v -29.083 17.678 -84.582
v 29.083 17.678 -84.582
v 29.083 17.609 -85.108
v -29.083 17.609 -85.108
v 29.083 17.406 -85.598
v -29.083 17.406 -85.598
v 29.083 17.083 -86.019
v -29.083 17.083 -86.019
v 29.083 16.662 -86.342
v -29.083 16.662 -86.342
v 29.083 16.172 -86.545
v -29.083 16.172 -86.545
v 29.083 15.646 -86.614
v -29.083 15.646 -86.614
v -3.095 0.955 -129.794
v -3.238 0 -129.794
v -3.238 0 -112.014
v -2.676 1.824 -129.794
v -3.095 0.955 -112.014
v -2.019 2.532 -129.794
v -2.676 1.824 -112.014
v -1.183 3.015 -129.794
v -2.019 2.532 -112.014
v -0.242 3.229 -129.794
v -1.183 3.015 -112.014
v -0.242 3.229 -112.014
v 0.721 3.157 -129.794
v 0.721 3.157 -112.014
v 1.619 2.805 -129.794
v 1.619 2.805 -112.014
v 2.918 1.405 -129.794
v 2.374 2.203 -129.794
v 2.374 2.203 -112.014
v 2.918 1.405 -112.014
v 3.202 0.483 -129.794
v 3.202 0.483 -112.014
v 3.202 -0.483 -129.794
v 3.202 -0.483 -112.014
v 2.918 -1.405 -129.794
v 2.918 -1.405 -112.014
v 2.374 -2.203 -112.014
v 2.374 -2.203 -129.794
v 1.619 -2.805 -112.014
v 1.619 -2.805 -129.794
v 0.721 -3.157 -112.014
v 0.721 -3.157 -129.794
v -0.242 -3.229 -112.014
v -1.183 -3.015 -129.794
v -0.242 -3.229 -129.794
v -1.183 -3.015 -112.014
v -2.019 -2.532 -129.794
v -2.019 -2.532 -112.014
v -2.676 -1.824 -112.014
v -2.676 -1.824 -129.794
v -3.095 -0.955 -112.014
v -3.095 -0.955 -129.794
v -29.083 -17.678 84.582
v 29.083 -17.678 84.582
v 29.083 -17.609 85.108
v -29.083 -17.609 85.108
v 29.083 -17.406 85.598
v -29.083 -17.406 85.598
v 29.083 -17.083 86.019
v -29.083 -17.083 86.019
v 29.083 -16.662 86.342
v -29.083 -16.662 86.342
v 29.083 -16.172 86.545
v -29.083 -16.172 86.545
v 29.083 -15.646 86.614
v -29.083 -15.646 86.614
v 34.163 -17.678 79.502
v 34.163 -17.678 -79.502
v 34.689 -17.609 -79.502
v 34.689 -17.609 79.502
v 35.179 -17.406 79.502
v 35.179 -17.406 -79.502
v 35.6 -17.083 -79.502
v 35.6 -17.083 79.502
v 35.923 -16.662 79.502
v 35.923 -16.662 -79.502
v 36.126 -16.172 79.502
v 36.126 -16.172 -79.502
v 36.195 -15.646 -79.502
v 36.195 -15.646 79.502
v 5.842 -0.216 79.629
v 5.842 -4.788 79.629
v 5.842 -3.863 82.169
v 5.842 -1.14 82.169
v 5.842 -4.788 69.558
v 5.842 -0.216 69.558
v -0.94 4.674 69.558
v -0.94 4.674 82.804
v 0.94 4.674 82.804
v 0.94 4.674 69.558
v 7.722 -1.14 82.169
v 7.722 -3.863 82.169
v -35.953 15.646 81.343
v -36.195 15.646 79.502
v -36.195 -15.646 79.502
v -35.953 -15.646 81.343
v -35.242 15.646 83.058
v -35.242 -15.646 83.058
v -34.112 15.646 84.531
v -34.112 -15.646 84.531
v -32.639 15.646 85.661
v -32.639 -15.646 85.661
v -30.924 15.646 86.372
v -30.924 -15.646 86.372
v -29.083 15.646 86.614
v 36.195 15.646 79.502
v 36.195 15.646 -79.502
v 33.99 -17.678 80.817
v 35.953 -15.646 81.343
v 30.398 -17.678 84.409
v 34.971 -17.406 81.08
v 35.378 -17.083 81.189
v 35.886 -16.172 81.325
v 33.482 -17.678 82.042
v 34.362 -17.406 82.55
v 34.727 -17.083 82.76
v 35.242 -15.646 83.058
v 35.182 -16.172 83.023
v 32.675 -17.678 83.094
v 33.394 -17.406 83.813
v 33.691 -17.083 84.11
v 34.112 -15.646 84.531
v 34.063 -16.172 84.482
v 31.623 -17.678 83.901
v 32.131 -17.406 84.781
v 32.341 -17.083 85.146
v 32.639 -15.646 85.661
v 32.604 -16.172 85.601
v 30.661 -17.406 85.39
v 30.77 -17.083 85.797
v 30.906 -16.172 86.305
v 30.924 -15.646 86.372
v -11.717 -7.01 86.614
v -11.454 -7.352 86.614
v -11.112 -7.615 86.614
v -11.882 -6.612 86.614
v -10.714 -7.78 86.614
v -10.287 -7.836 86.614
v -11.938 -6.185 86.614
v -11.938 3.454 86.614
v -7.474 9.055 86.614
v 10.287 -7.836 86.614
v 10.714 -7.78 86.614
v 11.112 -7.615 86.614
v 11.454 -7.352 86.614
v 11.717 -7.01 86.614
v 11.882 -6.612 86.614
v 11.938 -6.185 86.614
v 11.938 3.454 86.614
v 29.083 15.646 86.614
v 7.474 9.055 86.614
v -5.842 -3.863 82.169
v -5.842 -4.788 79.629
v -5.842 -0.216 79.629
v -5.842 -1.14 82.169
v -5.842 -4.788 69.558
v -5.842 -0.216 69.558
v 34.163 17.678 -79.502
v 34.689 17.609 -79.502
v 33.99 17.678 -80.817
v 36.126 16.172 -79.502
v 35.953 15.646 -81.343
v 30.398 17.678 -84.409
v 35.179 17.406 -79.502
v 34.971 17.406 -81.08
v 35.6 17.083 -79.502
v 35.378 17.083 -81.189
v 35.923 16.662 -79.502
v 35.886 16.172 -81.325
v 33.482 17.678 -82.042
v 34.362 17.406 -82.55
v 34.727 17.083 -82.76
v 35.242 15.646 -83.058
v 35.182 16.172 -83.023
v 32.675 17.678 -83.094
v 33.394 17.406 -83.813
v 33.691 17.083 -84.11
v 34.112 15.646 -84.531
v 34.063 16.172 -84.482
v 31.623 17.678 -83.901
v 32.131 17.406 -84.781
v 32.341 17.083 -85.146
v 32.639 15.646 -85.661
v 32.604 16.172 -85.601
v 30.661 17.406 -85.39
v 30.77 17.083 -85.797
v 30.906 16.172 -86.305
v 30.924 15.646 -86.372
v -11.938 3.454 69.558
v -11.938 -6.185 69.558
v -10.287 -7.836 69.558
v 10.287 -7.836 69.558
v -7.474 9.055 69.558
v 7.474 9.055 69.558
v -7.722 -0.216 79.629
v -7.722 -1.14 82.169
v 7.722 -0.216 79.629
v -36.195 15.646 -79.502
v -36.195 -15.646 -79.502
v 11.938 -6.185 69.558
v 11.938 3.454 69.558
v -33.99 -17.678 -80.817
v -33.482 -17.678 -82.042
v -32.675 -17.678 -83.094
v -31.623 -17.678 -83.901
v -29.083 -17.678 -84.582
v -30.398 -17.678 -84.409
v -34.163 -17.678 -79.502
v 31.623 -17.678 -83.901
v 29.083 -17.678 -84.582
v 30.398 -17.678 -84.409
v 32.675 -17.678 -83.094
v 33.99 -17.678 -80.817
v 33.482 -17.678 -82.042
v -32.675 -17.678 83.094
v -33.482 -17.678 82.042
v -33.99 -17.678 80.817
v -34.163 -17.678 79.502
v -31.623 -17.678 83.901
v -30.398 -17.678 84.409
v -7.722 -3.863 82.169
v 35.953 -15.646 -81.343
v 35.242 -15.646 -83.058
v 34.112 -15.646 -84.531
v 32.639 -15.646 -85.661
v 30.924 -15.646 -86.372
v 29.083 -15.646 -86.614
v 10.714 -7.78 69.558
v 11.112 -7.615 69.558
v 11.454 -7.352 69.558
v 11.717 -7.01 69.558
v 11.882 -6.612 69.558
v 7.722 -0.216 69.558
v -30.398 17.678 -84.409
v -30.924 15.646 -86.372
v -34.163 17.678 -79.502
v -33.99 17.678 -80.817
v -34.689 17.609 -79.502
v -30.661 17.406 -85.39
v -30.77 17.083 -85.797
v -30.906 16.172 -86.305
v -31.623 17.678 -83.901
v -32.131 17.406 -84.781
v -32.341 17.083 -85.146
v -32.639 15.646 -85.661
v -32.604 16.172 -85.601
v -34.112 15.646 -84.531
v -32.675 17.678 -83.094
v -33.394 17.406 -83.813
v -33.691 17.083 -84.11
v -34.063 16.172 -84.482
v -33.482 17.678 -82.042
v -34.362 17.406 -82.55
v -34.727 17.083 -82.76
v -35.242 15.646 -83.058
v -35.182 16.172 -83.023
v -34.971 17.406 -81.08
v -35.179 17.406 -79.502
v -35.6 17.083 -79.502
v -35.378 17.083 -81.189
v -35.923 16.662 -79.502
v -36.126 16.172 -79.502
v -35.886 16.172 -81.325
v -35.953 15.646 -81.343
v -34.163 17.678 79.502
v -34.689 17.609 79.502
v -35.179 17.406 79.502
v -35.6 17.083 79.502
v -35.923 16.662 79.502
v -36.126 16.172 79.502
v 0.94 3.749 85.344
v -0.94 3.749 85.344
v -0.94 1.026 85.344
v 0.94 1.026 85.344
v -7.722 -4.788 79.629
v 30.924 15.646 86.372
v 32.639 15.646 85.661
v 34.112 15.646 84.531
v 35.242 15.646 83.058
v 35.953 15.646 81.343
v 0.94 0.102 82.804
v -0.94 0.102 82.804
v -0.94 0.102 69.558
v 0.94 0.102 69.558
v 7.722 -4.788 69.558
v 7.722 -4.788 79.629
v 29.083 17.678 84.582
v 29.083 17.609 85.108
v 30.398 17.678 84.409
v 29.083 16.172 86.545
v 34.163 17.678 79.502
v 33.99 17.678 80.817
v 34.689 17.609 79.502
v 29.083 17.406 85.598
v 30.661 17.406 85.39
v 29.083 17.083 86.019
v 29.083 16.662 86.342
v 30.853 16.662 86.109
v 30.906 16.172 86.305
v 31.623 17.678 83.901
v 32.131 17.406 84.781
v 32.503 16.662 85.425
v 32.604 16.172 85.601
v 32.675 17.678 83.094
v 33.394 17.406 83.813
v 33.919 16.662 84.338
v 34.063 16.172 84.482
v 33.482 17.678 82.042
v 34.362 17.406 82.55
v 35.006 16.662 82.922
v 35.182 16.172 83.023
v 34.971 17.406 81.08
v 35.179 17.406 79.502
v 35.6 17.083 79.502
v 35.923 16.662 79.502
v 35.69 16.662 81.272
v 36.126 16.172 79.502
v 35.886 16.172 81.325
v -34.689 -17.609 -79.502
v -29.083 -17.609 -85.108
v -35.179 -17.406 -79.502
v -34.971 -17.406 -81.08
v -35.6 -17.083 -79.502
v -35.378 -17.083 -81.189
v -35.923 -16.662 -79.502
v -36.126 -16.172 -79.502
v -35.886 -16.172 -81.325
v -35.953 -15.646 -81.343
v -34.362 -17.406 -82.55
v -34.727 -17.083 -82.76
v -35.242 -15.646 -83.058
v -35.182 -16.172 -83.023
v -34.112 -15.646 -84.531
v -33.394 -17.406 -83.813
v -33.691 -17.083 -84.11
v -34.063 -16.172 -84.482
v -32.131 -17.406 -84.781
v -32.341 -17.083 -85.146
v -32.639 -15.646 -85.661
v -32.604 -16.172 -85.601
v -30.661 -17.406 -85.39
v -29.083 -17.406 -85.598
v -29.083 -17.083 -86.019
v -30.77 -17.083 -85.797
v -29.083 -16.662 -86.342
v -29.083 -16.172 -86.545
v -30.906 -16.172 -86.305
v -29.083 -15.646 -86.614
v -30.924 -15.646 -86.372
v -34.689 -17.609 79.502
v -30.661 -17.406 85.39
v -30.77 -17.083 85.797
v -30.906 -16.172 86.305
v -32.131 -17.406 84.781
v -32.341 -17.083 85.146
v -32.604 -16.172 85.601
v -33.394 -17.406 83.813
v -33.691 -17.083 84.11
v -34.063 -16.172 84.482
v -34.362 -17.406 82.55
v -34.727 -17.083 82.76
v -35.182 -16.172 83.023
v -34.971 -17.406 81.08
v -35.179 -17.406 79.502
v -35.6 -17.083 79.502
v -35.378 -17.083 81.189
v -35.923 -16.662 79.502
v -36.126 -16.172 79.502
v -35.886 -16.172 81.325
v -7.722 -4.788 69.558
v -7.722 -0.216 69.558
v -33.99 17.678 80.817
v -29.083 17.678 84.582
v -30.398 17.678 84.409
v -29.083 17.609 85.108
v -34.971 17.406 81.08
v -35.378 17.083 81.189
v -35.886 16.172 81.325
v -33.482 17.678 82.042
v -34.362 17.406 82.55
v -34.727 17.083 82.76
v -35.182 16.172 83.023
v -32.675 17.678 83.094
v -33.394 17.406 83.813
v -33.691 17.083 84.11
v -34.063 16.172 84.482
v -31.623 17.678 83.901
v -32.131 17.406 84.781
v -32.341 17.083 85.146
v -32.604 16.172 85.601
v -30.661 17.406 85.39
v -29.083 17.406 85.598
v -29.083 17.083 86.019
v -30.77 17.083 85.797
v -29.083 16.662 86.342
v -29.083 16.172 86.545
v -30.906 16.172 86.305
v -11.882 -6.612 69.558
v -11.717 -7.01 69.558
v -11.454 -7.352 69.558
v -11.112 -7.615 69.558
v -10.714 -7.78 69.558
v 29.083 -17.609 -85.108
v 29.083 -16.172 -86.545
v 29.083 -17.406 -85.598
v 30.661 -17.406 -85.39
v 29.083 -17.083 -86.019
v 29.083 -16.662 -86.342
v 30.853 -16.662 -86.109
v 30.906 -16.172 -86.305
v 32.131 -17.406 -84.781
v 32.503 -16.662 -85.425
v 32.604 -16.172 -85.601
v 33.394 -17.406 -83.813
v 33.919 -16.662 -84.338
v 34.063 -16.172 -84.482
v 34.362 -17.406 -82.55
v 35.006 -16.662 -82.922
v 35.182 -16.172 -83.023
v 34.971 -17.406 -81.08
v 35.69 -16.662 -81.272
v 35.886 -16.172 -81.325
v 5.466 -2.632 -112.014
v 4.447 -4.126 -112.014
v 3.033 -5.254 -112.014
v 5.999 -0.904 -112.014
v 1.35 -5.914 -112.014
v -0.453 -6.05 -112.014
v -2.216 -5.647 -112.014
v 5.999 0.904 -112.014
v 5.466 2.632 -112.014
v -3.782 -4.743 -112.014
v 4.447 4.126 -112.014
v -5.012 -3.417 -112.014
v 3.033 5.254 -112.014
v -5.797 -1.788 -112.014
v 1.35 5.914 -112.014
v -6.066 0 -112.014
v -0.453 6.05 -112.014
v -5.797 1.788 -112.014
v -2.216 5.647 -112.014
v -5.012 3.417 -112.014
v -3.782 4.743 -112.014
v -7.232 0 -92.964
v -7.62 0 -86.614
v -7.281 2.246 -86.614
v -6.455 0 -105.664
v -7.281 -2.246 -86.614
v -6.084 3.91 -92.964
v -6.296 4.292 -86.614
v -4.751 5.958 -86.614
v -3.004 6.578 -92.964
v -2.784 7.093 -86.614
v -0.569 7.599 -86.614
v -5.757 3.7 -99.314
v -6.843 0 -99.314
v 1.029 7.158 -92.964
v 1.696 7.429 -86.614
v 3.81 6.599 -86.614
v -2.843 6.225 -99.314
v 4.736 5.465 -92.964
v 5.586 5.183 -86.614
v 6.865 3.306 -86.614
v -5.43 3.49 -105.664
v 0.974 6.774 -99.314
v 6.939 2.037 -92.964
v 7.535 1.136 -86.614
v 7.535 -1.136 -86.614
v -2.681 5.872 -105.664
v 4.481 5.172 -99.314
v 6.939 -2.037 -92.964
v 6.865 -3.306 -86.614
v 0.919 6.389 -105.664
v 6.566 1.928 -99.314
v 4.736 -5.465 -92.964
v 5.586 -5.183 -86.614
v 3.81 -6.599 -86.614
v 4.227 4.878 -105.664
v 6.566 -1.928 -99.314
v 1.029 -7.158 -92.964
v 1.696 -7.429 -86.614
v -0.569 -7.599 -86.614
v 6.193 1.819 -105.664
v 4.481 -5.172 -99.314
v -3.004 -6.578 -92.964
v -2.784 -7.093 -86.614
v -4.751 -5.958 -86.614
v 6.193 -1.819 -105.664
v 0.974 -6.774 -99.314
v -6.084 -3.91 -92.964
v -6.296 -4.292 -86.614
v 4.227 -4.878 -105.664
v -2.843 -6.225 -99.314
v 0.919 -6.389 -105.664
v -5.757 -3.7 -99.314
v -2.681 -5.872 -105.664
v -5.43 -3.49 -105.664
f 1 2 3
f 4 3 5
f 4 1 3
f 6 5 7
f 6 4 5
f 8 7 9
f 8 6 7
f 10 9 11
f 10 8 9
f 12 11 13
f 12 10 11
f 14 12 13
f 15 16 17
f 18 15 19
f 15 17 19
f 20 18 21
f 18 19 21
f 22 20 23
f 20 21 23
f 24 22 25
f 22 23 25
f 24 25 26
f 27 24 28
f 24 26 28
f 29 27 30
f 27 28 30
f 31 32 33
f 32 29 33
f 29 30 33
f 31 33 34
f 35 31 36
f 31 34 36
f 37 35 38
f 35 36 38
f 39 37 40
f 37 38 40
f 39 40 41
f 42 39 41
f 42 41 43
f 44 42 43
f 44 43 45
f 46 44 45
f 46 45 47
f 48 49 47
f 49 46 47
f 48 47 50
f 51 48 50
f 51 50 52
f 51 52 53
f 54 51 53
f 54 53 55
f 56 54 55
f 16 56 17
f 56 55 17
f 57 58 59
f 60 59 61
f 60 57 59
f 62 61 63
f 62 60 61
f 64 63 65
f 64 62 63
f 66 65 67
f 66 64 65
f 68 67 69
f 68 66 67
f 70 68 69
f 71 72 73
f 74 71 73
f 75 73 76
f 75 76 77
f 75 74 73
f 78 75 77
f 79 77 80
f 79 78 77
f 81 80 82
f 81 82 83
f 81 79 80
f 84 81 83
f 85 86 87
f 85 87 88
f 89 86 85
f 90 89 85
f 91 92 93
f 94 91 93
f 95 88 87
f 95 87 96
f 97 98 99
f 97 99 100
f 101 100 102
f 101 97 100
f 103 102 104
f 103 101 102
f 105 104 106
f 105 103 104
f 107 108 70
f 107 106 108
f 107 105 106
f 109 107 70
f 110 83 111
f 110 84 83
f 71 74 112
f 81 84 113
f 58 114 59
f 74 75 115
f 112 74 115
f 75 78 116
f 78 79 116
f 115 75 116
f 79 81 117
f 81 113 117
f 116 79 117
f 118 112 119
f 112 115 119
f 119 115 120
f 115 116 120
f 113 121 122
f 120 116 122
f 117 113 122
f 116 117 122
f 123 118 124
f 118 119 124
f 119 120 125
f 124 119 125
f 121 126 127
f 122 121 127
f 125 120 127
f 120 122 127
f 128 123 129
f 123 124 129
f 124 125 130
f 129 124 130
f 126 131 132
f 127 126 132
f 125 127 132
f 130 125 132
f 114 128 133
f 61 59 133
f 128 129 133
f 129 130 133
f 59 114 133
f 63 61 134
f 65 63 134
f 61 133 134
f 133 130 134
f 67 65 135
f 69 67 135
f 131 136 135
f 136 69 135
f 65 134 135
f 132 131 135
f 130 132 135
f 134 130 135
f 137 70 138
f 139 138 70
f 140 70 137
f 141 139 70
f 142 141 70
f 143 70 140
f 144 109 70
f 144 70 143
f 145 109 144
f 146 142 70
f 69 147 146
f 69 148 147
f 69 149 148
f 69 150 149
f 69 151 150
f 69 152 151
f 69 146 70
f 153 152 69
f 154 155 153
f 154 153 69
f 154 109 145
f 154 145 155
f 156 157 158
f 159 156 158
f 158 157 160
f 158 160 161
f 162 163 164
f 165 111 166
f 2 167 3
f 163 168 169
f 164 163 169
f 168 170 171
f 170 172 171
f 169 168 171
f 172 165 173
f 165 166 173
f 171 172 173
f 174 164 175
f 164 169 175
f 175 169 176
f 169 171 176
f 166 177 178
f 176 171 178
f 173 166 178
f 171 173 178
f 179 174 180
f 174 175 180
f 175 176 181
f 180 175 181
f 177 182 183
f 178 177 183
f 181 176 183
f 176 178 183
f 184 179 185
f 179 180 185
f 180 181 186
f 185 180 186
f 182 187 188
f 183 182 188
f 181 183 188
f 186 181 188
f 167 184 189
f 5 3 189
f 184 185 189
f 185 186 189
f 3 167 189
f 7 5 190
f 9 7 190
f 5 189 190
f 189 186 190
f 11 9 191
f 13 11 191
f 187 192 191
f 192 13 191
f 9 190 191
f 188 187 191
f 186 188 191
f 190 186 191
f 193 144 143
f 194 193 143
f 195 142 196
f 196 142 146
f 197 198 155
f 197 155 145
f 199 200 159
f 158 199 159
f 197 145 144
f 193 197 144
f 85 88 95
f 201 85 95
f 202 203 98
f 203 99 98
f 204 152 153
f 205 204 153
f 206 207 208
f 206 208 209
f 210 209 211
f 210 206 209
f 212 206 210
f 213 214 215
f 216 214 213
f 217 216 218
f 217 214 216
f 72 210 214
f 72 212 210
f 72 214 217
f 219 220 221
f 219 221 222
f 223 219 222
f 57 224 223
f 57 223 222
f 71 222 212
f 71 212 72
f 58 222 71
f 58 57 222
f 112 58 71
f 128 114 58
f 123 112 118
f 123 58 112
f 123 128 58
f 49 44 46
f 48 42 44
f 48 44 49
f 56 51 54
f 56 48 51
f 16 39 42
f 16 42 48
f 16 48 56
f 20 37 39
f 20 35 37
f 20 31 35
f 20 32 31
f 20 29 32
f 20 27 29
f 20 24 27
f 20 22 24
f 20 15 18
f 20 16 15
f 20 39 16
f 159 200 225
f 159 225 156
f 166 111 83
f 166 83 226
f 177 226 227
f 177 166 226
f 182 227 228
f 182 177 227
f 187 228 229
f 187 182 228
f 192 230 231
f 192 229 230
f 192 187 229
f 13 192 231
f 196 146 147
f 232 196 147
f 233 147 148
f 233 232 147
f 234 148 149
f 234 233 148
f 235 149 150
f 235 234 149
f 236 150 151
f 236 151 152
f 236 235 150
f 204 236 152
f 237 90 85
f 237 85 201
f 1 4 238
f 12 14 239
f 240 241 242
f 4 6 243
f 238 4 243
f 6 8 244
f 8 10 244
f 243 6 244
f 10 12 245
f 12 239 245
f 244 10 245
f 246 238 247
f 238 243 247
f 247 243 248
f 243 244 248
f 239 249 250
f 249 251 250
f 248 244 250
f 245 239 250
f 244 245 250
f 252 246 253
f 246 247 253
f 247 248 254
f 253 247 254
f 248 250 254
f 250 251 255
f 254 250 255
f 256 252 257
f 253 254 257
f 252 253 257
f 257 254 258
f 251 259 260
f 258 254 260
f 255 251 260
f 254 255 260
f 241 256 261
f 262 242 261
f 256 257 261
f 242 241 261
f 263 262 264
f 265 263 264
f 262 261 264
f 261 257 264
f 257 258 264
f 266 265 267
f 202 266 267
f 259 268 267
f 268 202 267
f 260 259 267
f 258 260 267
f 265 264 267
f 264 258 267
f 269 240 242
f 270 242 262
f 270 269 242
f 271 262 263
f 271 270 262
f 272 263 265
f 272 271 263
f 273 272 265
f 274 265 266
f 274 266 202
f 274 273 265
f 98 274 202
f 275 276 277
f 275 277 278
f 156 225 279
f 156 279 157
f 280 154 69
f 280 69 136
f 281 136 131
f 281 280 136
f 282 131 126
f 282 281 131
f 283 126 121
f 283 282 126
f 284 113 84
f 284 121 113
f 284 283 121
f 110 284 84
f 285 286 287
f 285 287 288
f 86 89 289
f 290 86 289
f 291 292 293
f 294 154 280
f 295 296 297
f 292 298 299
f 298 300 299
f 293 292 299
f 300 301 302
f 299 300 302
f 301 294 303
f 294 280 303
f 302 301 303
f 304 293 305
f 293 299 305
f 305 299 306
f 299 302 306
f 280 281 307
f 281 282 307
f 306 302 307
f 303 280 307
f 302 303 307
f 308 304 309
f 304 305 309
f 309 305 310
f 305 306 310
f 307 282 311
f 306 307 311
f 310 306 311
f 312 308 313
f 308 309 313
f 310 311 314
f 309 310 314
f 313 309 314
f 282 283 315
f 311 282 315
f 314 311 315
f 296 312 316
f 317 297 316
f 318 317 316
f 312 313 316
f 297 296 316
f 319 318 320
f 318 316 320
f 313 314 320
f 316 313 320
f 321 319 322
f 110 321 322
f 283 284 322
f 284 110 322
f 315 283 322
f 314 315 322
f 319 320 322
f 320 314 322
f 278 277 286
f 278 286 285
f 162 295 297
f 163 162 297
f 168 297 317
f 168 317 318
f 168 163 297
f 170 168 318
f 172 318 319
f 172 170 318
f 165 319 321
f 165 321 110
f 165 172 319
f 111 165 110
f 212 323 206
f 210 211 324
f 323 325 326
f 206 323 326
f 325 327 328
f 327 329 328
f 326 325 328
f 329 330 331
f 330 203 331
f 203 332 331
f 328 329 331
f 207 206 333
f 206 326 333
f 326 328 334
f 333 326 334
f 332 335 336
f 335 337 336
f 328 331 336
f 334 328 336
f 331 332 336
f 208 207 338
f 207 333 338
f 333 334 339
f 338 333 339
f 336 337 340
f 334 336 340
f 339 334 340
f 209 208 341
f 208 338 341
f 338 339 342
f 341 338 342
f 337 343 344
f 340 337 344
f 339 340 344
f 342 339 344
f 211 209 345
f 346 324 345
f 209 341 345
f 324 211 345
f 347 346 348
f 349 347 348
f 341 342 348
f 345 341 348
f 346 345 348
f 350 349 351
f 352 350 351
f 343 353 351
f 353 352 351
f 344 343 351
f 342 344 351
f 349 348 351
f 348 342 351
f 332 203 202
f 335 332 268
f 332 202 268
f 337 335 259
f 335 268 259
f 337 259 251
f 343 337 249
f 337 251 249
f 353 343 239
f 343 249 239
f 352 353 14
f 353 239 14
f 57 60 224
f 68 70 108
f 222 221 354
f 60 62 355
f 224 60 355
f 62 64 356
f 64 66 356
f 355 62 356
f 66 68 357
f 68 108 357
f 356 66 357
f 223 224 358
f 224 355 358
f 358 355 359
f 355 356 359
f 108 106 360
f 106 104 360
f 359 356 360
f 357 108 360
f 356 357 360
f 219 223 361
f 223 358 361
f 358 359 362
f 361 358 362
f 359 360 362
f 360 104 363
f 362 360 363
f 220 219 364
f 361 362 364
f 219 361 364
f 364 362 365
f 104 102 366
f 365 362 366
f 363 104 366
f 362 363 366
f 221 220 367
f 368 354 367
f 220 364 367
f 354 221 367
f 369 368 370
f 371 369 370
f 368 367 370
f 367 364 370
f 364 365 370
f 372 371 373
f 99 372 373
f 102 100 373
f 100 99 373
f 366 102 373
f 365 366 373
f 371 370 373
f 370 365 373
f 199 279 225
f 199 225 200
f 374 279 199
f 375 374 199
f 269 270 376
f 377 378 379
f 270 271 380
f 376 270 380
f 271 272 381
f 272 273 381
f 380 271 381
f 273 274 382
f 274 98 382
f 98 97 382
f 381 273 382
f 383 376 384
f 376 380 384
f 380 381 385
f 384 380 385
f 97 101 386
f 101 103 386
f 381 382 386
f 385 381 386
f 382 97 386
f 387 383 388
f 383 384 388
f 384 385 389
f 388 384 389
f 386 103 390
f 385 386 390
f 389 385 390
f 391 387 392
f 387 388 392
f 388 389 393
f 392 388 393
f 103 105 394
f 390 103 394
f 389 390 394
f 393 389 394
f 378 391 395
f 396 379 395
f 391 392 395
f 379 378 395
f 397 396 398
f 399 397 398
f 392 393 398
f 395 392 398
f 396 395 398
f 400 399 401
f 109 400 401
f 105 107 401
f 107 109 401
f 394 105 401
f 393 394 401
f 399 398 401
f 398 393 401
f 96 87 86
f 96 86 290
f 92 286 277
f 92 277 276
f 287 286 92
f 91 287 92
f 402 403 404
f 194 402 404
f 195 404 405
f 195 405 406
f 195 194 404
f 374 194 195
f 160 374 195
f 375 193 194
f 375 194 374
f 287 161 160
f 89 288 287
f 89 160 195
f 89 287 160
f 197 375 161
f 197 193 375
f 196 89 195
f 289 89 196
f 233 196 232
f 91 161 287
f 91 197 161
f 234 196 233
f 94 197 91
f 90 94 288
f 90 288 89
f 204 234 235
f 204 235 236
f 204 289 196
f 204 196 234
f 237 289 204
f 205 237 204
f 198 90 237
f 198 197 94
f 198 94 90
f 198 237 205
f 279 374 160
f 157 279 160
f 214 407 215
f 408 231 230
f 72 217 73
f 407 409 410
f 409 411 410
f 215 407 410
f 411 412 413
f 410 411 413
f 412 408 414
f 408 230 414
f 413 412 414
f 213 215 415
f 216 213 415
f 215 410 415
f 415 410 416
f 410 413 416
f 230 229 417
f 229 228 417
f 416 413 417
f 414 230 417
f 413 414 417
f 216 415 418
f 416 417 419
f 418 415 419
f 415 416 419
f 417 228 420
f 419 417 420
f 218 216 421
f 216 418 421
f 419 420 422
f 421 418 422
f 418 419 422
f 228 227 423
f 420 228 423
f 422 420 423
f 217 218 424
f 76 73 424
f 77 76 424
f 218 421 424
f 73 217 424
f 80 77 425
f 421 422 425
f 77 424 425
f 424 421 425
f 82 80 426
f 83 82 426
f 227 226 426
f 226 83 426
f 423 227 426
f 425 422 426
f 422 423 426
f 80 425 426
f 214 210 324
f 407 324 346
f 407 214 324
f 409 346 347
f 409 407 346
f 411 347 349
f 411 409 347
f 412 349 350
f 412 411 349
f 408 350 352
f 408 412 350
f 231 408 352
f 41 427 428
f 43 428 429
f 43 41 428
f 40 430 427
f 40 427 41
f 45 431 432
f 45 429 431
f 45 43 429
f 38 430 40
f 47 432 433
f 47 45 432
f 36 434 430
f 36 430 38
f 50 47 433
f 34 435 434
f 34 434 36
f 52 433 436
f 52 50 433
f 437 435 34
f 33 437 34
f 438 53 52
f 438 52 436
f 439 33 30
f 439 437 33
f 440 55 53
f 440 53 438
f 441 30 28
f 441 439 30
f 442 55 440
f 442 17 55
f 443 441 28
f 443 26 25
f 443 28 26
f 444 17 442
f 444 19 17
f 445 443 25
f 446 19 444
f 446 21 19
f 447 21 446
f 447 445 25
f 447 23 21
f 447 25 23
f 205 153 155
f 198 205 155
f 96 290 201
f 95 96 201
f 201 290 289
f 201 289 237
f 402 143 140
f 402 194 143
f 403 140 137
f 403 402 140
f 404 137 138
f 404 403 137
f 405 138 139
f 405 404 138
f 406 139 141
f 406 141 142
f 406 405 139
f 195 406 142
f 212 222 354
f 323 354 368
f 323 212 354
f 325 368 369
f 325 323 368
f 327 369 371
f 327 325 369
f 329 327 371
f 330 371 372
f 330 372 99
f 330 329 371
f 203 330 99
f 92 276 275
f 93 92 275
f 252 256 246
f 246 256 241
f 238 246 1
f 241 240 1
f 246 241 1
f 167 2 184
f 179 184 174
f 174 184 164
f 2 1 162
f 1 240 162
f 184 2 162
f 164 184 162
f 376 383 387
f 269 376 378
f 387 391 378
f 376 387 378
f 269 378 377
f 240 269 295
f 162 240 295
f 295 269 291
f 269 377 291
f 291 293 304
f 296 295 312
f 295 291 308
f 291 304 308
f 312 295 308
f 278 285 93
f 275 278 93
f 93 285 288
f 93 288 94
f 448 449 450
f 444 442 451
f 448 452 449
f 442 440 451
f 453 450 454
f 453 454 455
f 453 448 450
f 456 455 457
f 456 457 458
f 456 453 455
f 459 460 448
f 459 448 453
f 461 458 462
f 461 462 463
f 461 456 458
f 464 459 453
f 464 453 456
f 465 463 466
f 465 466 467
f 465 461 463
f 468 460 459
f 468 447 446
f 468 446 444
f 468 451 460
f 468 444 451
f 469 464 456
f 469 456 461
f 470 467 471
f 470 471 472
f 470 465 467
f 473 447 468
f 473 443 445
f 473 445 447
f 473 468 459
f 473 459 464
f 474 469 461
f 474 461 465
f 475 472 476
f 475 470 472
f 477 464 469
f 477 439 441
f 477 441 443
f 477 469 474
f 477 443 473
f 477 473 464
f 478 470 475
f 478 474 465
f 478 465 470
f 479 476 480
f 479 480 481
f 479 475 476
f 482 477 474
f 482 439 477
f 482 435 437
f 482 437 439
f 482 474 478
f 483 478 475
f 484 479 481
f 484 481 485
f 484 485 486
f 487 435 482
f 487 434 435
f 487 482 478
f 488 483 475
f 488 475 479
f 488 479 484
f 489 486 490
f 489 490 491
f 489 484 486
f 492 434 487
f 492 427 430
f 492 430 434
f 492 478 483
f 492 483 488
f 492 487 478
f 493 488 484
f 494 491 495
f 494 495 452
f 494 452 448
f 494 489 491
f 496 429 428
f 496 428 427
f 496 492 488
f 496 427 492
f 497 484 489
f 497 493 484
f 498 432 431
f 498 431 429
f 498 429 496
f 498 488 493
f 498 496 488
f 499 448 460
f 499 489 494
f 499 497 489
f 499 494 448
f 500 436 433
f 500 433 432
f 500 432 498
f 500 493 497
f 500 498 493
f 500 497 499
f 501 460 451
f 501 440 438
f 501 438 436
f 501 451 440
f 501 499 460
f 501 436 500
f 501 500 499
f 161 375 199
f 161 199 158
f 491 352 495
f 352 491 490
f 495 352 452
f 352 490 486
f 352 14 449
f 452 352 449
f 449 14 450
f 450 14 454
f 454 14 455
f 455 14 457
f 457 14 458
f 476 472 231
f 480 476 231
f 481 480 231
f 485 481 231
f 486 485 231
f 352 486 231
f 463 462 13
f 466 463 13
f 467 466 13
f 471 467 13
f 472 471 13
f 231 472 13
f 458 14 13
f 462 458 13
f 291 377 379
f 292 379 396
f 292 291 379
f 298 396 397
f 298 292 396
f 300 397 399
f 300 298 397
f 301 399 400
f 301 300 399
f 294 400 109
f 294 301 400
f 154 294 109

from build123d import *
from OCP.BRepFilletAPI import BRepFilletAPI_MakeChamfer

# Parameters (mm, degrees)
SKETCH1_W           = 72.39
SKETCH1_H           = 35.3568
BOSS_EXTRUDE1_DEPTH = 86.614
FILLET1_R           = 7.112
FILLET2_R           = 2.032
CUT_EXTRUDE1_DEPTH  = 17.0561
FILLET3_R           = 1.651
SKETCH3_W           = 1.8796
SKETCH3_H           = 4.572
BOSS_EXTRUDE2_DEPTH = 15.7861
SKETCH4_W           = 15.4432
SKETCH4_H           = 4.572
CUT_EXTRUDE2_DEPTH  = 3.175
CHAMFER1_SIZE       = 2.54
CHAMFER1_SIZE2      = 0.924484395
SKETCH5_R           = 7.62
BOSS_EXTRUDE3_DEPTH = 25.4
BOSS_EXTRUDE3_TAPER = 3.5
SKETCH7_R           = 3.2385
BOSS_EXTRUDE4_DEPTH = 32.766
SKETCH8_R           = 10.8966
BOSS_EXTRUDE5_DEPTH = 34.417
FILLET4_R           = 0.635
SKETCH9_R           = 3.2385
BOSS_EXTRUDE6_DEPTH = 34.417
SKETCH10_R          = 27.900404375
CUT_EXTRUDE3_DEPTH  = 83.82


with BuildPart() as part:
    # Sketch1 → Boss-Extrude1 (new, symmetric)
    with BuildSketch(Plane.XY):
        Rectangle(SKETCH1_W, SKETCH1_H)
    extrude(amount=BOSS_EXTRUDE1_DEPTH, both=True)

    # Fillet1
    fillet1_edges = [part.edges().sort_by_distance(p)[0] for p in [
        (36.195, 0, 86.614),
        (-36.195, 0, 86.614),
        (36.195, 0, -86.614),
        (-36.195, 0, -86.614),
    ]]
    fillet(fillet1_edges, radius=FILLET1_R)

    # Fillet2
    fillet2_edges = [part.edges().sort_by_distance(p)[0] for p in [
        (36.195, 17.6784, 0),
        (36.195, -17.6784, 0),
        (0, 17.6784, -86.614),
        (-36.195, 17.6784, 0),
        (0, 17.6784, 86.614),
        (-34.111943428, 17.6784, 84.530943428),
        (34.111943428, 17.6784, 84.530943428),
        (-34.111943428, 17.6784, -84.530943428),
        (34.111943428, 17.6784, -84.530943428),
        (0, -17.6784, -86.614),
        (0, -17.6784, 86.614),
        (-36.195, -17.6784, 0),
        (-34.111943428, -17.6784, 84.530943428),
        (34.111943428, -17.6784, 84.530943428),
        (-34.111943428, -17.6784, -84.530943428),
        (34.111943428, -17.6784, -84.530943428),
    ]]
    fillet(fillet2_edges, radius=FILLET2_R)

    # Sketch2 → Cut-Extrude1 (cut)
    with BuildSketch(Plane.XY.offset(86.614)):
        Polygon((7.47395, 9.0551), (-7.47395, 9.0551), (-11.938, 3.4544), (-11.938, -7.8359), (11.938, -7.8359), (11.938, 3.4544), align=None)
    extrude(amount=-CUT_EXTRUDE1_DEPTH, mode=Mode.SUBTRACT)

    # Fillet3
    fillet3_edges = [part.edges().sort_by_distance(p)[0] for p in [
        (11.938, -7.8359, 78.08595),
        (-11.938, -7.8359, 78.08595),
    ]]
    fillet(fillet3_edges, radius=FILLET3_R)

    # Sketch3 → Boss-Extrude2 (add)
    with BuildSketch(Plane.XY.offset(69.5579)):
        with Locations((-6.7818, -2.5019)):
            Rectangle(SKETCH3_W, SKETCH3_H)
        with Locations((0, 2.3876)):
            Rectangle(SKETCH3_W, SKETCH3_H)
        with Locations((6.7818, -2.5019)):
            Rectangle(SKETCH3_W, SKETCH3_H)
    extrude(amount=BOSS_EXTRUDE2_DEPTH)

    # Sketch4 → Cut-Extrude2 (cut)
    with BuildSketch(Plane.XY.offset(85.344)):
        with Locations((0, -2.5019)):
            Rectangle(SKETCH4_W, SKETCH4_H)
    extrude(amount=-CUT_EXTRUDE2_DEPTH, mode=Mode.SUBTRACT)

    # Chamfer1: one chamfer whose edges measure the first distance from different faces: ONE call of the kernel's chamfer builder (chamfer() names one face for all edges)
    chamfer1_edges_1 = [part.edges().sort_by_distance(p)[0] for p in [
        (0, 4.6736, 85.344),
    ]]
    chamfer1_side_1 = [part.faces().sort_by_distance(p)[0] for p in [
        (0, 4.6736, 77.45095),
    ]]
    chamfer1_edges_2 = [part.edges().sort_by_distance(p)[0] for p in [
        (0, 0.1016, 85.344),
    ]]
    chamfer1_side_2 = [part.faces().sort_by_distance(p)[0] for p in [
        (0, 0.1016, 77.45095),
    ]]
    chamfer1_edges_3 = [part.edges().sort_by_distance(p)[0] for p in [
        (-6.7818, -0.2159, 82.169),
    ]]
    chamfer1_side_3 = [part.faces().sort_by_distance(p)[0] for p in [
        (-6.7818, -0.2159, 75.86345),
    ]]
    chamfer1_edges_4 = [part.edges().sort_by_distance(p)[0] for p in [
        (6.7818, -0.2159, 82.169),
    ]]
    chamfer1_side_4 = [part.faces().sort_by_distance(p)[0] for p in [
        (6.7818, -0.2159, 75.86345),
    ]]
    chamfer1_edges_5 = [part.edges().sort_by_distance(p)[0] for p in [
        (-6.7818, -4.7879, 82.169),
    ]]
    chamfer1_side_5 = [part.faces().sort_by_distance(p)[0] for p in [
        (-6.7818, -4.7879, 75.86345),
    ]]
    chamfer1_edges_6 = [part.edges().sort_by_distance(p)[0] for p in [
        (6.7818, -4.7879, 82.169),
    ]]
    chamfer1_side_6 = [part.faces().sort_by_distance(p)[0] for p in [
        (6.7818, -4.7879, 75.86345),
    ]]
    chamfer1 = BRepFilletAPI_MakeChamfer(part.part.solid().wrapped)
    for e in chamfer1_edges_1:
        chamfer1.Add(CHAMFER1_SIZE, CHAMFER1_SIZE2, e.wrapped, chamfer1_side_1[0].wrapped)  # the first distance lies on this face
    for e in chamfer1_edges_2:
        chamfer1.Add(CHAMFER1_SIZE, CHAMFER1_SIZE2, e.wrapped, chamfer1_side_2[0].wrapped)  # the first distance lies on this face
    for e in chamfer1_edges_3:
        chamfer1.Add(CHAMFER1_SIZE, CHAMFER1_SIZE2, e.wrapped, chamfer1_side_3[0].wrapped)  # the first distance lies on this face
    for e in chamfer1_edges_4:
        chamfer1.Add(CHAMFER1_SIZE, CHAMFER1_SIZE2, e.wrapped, chamfer1_side_4[0].wrapped)  # the first distance lies on this face
    for e in chamfer1_edges_5:
        chamfer1.Add(CHAMFER1_SIZE, CHAMFER1_SIZE2, e.wrapped, chamfer1_side_5[0].wrapped)  # the first distance lies on this face
    for e in chamfer1_edges_6:
        chamfer1.Add(CHAMFER1_SIZE, CHAMFER1_SIZE2, e.wrapped, chamfer1_side_6[0].wrapped)  # the first distance lies on this face
    add(Compound.cast(chamfer1.Shape()), mode=Mode.REPLACE)

    # Sketch5 → Boss-Extrude3 (add)
    with BuildSketch(Plane(origin=(0, 0, -86.614), x_dir=(-1, 0, 0), z_dir=(0, 0, -1))):
        Circle(SKETCH5_R)
    extrude(amount=BOSS_EXTRUDE3_DEPTH, taper=BOSS_EXTRUDE3_TAPER)

    # Sketch7 → Boss-Extrude4 (add)
    with BuildSketch(Plane(origin=(0, 0, -112.014), x_dir=(-1, 0, 0), z_dir=(0, 0, -1))):
        Circle(SKETCH7_R)
    extrude(amount=BOSS_EXTRUDE4_DEPTH)

    # Sketch8 → Boss-Extrude5 (add)
    with BuildSketch(Plane(origin=(0, 0, -144.78), x_dir=(-1, 0, 0), z_dir=(0, 0, -1))):
        Circle(SKETCH8_R)
    extrude(amount=BOSS_EXTRUDE5_DEPTH)

    # Fillet4
    fillet4_edges = [part.edges().sort_by_distance(p)[0] for p in [
        (10.8966, 0, -144.78),
        (10.8966, 0, -179.197),
    ]]
    fillet(fillet4_edges, radius=FILLET4_R)

    # Sketch9 → Boss-Extrude6 (add)
    with BuildSketch(Plane(origin=(0, 0, -179.197), x_dir=(-1, 0, 0), z_dir=(0, 0, -1))):
        Circle(SKETCH9_R)
    extrude(amount=BOSS_EXTRUDE6_DEPTH)

    # Sketch10 → Cut-Extrude3 (cut)
    with BuildSketch(Plane(origin=(0, 0, -213.614), x_dir=(-1, 0, 0), z_dir=(0, 0, -1))):
        Circle(SKETCH10_R)
    extrude(amount=-CUT_EXTRUDE3_DEPTH, mode=Mode.SUBTRACT)


solid = part.part
